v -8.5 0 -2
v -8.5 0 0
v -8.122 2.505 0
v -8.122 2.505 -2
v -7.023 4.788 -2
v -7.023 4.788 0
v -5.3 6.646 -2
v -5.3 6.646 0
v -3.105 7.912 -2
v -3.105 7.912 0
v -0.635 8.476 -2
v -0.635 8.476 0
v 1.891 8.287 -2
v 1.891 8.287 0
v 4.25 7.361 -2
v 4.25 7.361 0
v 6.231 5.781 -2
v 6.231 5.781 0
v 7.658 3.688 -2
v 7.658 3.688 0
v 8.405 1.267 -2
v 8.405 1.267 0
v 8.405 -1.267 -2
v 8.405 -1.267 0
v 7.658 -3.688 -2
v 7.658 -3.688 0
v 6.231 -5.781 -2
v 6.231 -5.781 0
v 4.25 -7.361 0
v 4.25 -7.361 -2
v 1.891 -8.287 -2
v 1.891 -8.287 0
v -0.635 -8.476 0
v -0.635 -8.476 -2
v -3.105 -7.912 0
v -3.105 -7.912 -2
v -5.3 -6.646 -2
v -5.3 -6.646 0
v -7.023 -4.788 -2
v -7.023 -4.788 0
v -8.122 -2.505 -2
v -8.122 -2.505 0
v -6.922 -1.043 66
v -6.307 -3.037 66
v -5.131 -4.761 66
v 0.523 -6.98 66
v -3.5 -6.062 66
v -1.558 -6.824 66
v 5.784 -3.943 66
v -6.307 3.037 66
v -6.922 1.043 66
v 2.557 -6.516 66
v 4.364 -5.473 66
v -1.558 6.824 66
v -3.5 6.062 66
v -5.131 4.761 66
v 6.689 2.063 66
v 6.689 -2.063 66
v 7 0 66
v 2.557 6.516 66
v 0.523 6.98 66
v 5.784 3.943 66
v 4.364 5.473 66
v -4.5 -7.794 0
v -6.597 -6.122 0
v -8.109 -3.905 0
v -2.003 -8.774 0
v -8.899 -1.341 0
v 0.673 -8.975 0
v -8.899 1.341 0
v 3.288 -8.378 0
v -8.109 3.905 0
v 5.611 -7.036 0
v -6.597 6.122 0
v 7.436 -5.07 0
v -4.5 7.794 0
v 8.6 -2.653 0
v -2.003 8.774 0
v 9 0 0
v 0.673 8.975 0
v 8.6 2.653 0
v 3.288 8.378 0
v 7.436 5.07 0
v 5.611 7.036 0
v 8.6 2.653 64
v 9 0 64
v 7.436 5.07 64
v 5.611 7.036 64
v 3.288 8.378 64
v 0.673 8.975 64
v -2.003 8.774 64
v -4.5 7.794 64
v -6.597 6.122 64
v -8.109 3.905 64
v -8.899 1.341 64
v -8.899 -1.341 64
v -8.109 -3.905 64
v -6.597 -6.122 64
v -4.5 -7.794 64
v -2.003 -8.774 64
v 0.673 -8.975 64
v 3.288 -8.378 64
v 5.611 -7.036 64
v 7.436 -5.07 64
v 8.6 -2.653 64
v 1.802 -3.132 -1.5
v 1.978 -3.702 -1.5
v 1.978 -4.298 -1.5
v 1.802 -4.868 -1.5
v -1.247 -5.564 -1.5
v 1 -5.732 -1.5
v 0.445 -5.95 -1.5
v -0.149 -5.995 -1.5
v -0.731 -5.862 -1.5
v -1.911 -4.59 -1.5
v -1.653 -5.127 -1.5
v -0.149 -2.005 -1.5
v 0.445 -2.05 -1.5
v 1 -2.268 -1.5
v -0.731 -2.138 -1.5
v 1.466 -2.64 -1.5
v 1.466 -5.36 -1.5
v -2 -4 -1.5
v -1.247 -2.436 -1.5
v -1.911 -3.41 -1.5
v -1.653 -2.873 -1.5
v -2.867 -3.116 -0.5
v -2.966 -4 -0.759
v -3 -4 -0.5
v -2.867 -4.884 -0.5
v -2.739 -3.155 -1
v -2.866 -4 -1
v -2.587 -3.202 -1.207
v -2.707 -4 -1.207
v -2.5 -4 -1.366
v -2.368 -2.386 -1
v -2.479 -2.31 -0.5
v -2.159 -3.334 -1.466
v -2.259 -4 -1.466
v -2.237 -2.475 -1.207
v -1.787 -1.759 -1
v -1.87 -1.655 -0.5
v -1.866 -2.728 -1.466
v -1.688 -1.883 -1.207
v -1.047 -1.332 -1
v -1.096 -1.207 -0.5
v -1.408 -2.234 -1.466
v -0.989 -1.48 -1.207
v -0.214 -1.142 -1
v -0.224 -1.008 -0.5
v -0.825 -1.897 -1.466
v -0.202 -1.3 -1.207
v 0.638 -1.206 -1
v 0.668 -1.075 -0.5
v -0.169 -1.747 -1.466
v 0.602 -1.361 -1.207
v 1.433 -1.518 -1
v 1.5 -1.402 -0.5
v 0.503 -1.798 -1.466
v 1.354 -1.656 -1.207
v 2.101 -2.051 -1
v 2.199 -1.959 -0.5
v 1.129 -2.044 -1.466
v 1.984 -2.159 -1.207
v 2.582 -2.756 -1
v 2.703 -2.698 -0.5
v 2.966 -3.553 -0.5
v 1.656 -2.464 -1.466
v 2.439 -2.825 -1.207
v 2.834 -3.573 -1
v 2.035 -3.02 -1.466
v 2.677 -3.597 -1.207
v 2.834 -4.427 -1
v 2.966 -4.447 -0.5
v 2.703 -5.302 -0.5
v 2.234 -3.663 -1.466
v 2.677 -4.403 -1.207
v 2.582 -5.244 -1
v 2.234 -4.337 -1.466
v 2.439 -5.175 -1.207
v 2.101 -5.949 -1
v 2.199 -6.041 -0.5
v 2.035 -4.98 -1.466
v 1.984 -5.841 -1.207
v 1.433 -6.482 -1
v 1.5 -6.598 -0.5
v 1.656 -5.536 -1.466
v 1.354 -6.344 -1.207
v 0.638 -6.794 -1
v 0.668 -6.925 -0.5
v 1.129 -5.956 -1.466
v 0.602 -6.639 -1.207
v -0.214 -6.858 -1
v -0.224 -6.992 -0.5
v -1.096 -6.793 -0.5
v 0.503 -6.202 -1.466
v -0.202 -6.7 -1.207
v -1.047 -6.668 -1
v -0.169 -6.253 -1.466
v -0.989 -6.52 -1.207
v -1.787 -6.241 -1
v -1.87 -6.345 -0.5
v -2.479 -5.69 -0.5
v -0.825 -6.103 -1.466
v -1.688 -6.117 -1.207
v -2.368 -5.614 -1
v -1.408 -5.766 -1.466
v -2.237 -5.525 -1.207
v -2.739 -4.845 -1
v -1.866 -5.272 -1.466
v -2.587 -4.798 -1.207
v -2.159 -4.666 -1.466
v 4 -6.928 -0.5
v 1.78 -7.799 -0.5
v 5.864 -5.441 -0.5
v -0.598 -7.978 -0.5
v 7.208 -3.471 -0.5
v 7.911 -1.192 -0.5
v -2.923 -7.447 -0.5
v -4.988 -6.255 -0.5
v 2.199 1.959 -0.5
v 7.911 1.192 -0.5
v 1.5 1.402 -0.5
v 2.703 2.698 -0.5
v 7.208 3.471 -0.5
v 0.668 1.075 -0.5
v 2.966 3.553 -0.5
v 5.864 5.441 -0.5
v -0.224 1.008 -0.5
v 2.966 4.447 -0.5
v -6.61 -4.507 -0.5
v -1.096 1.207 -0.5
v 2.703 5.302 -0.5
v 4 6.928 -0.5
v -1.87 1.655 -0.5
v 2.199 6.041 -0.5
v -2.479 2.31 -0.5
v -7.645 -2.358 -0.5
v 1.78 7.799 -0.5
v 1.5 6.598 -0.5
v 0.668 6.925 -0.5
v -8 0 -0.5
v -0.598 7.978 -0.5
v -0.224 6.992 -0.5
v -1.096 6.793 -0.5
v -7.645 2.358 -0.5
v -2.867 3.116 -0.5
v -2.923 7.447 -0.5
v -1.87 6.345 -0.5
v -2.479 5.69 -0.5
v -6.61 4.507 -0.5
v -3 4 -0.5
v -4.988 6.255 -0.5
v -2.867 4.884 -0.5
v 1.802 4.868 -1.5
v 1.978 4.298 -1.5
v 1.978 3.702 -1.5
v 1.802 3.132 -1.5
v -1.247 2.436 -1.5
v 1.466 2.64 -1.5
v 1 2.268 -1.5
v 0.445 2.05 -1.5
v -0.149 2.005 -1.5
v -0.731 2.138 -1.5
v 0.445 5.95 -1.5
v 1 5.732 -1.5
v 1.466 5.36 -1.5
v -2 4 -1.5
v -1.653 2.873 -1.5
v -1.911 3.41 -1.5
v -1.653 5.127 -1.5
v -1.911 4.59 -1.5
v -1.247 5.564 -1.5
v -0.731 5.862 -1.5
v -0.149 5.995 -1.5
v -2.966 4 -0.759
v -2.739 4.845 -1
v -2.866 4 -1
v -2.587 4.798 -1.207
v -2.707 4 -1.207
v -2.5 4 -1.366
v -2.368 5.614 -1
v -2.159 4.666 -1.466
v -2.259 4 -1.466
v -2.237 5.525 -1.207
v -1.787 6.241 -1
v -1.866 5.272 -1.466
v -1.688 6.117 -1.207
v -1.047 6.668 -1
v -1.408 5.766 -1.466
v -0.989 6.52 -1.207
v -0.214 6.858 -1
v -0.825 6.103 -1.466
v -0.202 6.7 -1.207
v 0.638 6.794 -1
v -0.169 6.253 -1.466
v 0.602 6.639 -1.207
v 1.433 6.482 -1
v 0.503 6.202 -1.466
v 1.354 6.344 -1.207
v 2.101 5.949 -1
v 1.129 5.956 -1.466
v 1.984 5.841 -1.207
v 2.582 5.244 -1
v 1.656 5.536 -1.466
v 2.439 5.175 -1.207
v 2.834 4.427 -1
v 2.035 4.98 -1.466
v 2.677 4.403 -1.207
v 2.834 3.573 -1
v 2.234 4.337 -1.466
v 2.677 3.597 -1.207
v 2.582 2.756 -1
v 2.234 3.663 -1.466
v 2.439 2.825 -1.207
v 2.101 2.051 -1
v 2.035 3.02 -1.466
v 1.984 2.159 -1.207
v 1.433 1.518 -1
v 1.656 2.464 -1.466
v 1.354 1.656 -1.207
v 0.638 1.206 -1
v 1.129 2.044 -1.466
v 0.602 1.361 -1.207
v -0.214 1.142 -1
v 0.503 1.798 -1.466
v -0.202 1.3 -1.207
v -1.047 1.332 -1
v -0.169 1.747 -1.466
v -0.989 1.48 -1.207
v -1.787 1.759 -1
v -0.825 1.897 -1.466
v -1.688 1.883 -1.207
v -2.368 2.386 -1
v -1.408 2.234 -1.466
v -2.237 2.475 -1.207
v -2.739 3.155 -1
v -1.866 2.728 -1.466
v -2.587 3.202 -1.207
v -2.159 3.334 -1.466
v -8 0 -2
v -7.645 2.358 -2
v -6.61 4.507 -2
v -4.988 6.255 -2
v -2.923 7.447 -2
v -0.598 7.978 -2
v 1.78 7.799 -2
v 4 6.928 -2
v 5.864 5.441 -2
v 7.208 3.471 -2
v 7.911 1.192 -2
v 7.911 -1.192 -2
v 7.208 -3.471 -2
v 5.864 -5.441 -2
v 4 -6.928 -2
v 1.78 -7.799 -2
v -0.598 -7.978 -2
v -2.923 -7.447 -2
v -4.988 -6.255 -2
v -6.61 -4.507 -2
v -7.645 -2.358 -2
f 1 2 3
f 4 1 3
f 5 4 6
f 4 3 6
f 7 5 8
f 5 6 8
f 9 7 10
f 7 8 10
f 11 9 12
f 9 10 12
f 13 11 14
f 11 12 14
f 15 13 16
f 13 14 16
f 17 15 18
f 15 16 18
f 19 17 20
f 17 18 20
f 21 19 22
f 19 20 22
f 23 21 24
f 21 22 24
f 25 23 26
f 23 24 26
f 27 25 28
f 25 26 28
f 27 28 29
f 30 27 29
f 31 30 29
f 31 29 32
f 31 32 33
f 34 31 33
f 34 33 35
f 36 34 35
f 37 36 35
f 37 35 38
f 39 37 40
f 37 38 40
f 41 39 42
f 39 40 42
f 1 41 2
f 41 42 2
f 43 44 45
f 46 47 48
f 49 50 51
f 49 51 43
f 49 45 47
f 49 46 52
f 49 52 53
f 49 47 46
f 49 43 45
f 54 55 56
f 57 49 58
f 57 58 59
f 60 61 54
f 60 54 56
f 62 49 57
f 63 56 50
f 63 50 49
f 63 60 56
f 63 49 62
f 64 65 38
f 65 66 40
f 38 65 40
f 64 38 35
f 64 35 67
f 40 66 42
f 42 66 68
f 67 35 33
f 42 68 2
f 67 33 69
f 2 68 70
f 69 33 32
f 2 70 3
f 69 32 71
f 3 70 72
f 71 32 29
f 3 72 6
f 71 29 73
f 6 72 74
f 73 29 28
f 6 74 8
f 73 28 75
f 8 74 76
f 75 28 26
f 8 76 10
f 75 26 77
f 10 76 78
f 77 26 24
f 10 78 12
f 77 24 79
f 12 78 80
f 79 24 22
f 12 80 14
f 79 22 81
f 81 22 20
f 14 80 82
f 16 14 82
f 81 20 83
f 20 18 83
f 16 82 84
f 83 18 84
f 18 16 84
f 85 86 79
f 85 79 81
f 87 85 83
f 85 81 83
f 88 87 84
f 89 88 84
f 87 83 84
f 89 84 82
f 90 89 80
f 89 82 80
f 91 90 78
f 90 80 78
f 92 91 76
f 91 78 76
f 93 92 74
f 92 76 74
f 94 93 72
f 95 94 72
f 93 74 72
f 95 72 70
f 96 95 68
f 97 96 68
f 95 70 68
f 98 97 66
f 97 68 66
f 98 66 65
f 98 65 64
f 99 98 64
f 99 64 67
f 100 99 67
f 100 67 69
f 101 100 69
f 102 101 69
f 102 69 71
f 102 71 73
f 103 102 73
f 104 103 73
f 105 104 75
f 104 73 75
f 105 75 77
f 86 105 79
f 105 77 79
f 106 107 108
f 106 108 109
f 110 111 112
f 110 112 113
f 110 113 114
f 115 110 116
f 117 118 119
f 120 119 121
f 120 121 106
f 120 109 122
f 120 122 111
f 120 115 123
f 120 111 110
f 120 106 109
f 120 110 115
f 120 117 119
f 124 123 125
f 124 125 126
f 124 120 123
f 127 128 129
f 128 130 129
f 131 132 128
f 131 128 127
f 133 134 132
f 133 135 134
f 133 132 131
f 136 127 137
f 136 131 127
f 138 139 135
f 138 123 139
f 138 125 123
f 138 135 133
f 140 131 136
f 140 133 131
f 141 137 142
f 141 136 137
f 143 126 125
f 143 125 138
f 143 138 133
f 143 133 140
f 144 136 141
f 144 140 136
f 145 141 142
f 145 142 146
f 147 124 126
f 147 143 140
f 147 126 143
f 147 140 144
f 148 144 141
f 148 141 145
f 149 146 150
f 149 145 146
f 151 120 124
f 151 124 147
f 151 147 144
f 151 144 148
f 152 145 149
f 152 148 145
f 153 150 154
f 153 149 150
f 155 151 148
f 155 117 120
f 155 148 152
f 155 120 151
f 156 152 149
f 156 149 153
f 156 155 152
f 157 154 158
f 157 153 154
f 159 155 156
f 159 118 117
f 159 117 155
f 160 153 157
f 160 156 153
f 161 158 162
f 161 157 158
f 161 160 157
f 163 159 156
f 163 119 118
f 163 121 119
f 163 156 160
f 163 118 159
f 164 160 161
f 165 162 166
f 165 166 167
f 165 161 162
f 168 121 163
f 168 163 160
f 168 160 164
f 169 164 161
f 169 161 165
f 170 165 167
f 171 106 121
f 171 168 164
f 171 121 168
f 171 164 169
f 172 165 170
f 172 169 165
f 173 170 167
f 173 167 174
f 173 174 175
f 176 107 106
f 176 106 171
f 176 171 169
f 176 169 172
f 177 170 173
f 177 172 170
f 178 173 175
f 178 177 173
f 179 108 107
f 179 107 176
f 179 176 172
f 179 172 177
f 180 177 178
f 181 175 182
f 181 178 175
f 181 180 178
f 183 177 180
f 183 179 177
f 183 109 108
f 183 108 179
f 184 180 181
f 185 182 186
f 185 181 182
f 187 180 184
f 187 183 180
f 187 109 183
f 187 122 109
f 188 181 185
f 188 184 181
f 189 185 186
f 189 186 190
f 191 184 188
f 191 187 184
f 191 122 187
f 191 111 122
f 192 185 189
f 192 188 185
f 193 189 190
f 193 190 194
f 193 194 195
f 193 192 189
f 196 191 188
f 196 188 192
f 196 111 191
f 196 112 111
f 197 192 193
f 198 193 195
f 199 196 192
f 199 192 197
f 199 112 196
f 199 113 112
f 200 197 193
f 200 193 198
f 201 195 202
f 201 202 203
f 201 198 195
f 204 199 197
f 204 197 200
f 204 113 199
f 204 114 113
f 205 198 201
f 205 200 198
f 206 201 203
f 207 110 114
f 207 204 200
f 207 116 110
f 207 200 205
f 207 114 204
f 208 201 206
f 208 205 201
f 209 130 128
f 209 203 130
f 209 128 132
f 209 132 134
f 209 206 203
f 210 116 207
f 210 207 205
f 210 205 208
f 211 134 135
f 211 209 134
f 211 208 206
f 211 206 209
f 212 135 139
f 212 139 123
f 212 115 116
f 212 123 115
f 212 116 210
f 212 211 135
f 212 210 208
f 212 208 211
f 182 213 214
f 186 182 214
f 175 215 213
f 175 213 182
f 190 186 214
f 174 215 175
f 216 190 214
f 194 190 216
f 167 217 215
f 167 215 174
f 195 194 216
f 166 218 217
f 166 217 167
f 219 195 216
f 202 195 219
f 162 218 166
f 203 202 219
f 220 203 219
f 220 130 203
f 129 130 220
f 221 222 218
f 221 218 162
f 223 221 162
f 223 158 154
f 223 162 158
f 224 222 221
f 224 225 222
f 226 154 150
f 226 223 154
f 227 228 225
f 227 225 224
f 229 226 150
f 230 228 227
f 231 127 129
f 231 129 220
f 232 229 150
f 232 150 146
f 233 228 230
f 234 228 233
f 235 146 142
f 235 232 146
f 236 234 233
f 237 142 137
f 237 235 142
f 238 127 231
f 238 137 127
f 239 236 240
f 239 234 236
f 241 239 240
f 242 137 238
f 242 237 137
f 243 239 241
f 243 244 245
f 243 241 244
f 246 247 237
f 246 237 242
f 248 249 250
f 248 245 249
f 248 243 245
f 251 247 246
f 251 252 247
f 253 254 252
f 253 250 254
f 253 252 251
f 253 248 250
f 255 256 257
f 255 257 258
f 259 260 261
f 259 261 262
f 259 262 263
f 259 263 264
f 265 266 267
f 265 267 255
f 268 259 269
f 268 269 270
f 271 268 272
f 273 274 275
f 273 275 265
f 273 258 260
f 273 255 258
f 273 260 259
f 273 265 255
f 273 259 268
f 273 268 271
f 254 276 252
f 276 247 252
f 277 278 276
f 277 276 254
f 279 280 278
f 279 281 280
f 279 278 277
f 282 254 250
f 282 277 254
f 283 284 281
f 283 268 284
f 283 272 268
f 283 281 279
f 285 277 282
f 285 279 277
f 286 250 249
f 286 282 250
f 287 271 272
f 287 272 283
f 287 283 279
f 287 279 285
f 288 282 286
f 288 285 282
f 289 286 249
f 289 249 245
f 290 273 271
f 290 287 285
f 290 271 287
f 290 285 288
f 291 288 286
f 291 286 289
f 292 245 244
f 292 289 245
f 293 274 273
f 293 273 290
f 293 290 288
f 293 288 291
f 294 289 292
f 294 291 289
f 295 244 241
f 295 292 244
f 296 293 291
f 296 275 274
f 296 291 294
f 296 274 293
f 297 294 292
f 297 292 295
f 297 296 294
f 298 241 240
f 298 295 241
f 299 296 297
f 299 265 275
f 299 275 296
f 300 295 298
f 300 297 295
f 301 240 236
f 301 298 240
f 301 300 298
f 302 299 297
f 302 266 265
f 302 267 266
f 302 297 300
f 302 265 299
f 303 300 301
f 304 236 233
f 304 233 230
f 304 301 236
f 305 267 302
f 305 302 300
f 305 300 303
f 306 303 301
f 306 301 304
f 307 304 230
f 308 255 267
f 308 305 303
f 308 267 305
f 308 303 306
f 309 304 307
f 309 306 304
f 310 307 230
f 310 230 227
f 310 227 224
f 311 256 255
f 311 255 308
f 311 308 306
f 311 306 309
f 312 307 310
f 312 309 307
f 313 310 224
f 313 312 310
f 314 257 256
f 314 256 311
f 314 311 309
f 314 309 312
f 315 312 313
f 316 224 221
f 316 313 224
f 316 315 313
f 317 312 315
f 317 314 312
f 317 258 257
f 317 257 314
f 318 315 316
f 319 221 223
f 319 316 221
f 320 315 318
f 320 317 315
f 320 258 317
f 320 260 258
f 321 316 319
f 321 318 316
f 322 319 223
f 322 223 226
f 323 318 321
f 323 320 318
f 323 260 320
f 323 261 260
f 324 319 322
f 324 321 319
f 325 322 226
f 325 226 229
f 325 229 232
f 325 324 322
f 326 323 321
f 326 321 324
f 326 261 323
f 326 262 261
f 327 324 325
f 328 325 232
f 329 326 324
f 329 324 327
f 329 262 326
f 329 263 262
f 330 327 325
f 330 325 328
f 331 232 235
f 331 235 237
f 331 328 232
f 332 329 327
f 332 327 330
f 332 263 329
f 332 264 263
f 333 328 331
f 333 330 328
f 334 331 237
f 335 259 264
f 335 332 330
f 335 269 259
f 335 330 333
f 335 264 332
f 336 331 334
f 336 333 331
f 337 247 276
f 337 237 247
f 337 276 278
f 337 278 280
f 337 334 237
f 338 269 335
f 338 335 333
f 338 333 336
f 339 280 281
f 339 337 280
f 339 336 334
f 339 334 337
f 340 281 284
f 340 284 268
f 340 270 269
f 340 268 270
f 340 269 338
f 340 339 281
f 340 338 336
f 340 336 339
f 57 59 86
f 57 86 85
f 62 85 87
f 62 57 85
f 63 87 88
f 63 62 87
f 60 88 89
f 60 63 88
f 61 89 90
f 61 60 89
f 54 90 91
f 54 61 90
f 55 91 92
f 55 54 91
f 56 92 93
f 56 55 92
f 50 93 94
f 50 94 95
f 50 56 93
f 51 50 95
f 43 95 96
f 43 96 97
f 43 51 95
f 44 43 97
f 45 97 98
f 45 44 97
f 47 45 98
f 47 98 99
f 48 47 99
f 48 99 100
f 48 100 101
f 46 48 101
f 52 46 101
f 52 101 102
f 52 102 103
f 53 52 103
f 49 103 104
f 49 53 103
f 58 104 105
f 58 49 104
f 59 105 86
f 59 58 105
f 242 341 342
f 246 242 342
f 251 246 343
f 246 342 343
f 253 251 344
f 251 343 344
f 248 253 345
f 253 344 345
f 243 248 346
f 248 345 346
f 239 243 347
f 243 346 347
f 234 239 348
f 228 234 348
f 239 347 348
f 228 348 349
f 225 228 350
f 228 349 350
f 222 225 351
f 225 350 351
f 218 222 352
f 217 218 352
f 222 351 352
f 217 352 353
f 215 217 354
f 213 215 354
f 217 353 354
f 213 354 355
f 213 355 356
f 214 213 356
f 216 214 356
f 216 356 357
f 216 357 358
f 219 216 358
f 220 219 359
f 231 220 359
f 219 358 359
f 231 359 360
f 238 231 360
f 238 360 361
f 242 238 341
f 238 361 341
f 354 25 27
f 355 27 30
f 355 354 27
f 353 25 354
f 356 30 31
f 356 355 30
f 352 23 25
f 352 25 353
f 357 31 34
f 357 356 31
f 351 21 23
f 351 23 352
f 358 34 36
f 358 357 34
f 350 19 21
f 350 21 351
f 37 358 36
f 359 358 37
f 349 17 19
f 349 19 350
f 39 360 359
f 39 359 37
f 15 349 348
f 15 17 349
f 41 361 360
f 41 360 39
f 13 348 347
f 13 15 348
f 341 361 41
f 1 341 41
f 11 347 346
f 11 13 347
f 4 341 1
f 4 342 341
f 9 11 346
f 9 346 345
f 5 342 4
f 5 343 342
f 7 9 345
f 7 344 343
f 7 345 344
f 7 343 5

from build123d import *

# Parameters (mm, degrees)
SKETCH1_R           = 9
BOSS_EXTRUDE1_DEPTH = 66
SKETCH2_R           = 8.5
BOSS_EXTRUDE2_DEPTH = 2
SKETCH3_R           = 8
CUT_EXTRUDE1_DEPTH  = 1.5
SKETCH4_R           = 3
BOSS_EXTRUDE3_DEPTH = 1
FILLET1_R           = 1
CHAMFER1_SIZE       = 2


with BuildPart() as part:
    # Sketch1 → Boss-Extrude1 (new body)
    with BuildSketch(Plane.XY):
        Circle(SKETCH1_R)
    extrude(amount=BOSS_EXTRUDE1_DEPTH)

    # Sketch2 → Boss-Extrude2 (add)
    with BuildSketch(Plane(origin=(0, 0, 0), x_dir=(-1, 0, 0), z_dir=(0, 0, -1))):
        Circle(SKETCH2_R)
    extrude(amount=BOSS_EXTRUDE2_DEPTH)

    # Sketch3 → Cut-Extrude1 (cut)
    with BuildSketch(Plane(origin=(0, 0, -2), x_dir=(-1, 0, 0), z_dir=(0, 0, -1))):
        Circle(SKETCH3_R)
    extrude(amount=-CUT_EXTRUDE1_DEPTH, mode=Mode.SUBTRACT)

    # Sketch4 → Boss-Extrude3 (add)
    with BuildSketch(Plane(origin=(0, 0, -0.5), x_dir=(-1, 0, 0), z_dir=(0, 0, -1))):
        with Locations((0, 4)):
            Circle(SKETCH4_R)
        with Locations((0, -4)):
            Circle(SKETCH4_R)
    extrude(amount=BOSS_EXTRUDE3_DEPTH)

    # Fillet1
    fillet1_edges = [part.edges().sort_by_distance(p)[0] for p in [
        (3, 4, -1.5),
        (3, -4, -1.5),
    ]]
    fillet(fillet1_edges, radius=FILLET1_R - 0.0001)  # a hair under: the kernel refuses the full size

    # Chamfer1
    chamfer1_edges = [part.edges().sort_by_distance(p)[0] for p in [
        (-9, 0, 66),
    ]]
    chamfer(chamfer1_edges, length=CHAMFER1_SIZE)


solid = part.part
